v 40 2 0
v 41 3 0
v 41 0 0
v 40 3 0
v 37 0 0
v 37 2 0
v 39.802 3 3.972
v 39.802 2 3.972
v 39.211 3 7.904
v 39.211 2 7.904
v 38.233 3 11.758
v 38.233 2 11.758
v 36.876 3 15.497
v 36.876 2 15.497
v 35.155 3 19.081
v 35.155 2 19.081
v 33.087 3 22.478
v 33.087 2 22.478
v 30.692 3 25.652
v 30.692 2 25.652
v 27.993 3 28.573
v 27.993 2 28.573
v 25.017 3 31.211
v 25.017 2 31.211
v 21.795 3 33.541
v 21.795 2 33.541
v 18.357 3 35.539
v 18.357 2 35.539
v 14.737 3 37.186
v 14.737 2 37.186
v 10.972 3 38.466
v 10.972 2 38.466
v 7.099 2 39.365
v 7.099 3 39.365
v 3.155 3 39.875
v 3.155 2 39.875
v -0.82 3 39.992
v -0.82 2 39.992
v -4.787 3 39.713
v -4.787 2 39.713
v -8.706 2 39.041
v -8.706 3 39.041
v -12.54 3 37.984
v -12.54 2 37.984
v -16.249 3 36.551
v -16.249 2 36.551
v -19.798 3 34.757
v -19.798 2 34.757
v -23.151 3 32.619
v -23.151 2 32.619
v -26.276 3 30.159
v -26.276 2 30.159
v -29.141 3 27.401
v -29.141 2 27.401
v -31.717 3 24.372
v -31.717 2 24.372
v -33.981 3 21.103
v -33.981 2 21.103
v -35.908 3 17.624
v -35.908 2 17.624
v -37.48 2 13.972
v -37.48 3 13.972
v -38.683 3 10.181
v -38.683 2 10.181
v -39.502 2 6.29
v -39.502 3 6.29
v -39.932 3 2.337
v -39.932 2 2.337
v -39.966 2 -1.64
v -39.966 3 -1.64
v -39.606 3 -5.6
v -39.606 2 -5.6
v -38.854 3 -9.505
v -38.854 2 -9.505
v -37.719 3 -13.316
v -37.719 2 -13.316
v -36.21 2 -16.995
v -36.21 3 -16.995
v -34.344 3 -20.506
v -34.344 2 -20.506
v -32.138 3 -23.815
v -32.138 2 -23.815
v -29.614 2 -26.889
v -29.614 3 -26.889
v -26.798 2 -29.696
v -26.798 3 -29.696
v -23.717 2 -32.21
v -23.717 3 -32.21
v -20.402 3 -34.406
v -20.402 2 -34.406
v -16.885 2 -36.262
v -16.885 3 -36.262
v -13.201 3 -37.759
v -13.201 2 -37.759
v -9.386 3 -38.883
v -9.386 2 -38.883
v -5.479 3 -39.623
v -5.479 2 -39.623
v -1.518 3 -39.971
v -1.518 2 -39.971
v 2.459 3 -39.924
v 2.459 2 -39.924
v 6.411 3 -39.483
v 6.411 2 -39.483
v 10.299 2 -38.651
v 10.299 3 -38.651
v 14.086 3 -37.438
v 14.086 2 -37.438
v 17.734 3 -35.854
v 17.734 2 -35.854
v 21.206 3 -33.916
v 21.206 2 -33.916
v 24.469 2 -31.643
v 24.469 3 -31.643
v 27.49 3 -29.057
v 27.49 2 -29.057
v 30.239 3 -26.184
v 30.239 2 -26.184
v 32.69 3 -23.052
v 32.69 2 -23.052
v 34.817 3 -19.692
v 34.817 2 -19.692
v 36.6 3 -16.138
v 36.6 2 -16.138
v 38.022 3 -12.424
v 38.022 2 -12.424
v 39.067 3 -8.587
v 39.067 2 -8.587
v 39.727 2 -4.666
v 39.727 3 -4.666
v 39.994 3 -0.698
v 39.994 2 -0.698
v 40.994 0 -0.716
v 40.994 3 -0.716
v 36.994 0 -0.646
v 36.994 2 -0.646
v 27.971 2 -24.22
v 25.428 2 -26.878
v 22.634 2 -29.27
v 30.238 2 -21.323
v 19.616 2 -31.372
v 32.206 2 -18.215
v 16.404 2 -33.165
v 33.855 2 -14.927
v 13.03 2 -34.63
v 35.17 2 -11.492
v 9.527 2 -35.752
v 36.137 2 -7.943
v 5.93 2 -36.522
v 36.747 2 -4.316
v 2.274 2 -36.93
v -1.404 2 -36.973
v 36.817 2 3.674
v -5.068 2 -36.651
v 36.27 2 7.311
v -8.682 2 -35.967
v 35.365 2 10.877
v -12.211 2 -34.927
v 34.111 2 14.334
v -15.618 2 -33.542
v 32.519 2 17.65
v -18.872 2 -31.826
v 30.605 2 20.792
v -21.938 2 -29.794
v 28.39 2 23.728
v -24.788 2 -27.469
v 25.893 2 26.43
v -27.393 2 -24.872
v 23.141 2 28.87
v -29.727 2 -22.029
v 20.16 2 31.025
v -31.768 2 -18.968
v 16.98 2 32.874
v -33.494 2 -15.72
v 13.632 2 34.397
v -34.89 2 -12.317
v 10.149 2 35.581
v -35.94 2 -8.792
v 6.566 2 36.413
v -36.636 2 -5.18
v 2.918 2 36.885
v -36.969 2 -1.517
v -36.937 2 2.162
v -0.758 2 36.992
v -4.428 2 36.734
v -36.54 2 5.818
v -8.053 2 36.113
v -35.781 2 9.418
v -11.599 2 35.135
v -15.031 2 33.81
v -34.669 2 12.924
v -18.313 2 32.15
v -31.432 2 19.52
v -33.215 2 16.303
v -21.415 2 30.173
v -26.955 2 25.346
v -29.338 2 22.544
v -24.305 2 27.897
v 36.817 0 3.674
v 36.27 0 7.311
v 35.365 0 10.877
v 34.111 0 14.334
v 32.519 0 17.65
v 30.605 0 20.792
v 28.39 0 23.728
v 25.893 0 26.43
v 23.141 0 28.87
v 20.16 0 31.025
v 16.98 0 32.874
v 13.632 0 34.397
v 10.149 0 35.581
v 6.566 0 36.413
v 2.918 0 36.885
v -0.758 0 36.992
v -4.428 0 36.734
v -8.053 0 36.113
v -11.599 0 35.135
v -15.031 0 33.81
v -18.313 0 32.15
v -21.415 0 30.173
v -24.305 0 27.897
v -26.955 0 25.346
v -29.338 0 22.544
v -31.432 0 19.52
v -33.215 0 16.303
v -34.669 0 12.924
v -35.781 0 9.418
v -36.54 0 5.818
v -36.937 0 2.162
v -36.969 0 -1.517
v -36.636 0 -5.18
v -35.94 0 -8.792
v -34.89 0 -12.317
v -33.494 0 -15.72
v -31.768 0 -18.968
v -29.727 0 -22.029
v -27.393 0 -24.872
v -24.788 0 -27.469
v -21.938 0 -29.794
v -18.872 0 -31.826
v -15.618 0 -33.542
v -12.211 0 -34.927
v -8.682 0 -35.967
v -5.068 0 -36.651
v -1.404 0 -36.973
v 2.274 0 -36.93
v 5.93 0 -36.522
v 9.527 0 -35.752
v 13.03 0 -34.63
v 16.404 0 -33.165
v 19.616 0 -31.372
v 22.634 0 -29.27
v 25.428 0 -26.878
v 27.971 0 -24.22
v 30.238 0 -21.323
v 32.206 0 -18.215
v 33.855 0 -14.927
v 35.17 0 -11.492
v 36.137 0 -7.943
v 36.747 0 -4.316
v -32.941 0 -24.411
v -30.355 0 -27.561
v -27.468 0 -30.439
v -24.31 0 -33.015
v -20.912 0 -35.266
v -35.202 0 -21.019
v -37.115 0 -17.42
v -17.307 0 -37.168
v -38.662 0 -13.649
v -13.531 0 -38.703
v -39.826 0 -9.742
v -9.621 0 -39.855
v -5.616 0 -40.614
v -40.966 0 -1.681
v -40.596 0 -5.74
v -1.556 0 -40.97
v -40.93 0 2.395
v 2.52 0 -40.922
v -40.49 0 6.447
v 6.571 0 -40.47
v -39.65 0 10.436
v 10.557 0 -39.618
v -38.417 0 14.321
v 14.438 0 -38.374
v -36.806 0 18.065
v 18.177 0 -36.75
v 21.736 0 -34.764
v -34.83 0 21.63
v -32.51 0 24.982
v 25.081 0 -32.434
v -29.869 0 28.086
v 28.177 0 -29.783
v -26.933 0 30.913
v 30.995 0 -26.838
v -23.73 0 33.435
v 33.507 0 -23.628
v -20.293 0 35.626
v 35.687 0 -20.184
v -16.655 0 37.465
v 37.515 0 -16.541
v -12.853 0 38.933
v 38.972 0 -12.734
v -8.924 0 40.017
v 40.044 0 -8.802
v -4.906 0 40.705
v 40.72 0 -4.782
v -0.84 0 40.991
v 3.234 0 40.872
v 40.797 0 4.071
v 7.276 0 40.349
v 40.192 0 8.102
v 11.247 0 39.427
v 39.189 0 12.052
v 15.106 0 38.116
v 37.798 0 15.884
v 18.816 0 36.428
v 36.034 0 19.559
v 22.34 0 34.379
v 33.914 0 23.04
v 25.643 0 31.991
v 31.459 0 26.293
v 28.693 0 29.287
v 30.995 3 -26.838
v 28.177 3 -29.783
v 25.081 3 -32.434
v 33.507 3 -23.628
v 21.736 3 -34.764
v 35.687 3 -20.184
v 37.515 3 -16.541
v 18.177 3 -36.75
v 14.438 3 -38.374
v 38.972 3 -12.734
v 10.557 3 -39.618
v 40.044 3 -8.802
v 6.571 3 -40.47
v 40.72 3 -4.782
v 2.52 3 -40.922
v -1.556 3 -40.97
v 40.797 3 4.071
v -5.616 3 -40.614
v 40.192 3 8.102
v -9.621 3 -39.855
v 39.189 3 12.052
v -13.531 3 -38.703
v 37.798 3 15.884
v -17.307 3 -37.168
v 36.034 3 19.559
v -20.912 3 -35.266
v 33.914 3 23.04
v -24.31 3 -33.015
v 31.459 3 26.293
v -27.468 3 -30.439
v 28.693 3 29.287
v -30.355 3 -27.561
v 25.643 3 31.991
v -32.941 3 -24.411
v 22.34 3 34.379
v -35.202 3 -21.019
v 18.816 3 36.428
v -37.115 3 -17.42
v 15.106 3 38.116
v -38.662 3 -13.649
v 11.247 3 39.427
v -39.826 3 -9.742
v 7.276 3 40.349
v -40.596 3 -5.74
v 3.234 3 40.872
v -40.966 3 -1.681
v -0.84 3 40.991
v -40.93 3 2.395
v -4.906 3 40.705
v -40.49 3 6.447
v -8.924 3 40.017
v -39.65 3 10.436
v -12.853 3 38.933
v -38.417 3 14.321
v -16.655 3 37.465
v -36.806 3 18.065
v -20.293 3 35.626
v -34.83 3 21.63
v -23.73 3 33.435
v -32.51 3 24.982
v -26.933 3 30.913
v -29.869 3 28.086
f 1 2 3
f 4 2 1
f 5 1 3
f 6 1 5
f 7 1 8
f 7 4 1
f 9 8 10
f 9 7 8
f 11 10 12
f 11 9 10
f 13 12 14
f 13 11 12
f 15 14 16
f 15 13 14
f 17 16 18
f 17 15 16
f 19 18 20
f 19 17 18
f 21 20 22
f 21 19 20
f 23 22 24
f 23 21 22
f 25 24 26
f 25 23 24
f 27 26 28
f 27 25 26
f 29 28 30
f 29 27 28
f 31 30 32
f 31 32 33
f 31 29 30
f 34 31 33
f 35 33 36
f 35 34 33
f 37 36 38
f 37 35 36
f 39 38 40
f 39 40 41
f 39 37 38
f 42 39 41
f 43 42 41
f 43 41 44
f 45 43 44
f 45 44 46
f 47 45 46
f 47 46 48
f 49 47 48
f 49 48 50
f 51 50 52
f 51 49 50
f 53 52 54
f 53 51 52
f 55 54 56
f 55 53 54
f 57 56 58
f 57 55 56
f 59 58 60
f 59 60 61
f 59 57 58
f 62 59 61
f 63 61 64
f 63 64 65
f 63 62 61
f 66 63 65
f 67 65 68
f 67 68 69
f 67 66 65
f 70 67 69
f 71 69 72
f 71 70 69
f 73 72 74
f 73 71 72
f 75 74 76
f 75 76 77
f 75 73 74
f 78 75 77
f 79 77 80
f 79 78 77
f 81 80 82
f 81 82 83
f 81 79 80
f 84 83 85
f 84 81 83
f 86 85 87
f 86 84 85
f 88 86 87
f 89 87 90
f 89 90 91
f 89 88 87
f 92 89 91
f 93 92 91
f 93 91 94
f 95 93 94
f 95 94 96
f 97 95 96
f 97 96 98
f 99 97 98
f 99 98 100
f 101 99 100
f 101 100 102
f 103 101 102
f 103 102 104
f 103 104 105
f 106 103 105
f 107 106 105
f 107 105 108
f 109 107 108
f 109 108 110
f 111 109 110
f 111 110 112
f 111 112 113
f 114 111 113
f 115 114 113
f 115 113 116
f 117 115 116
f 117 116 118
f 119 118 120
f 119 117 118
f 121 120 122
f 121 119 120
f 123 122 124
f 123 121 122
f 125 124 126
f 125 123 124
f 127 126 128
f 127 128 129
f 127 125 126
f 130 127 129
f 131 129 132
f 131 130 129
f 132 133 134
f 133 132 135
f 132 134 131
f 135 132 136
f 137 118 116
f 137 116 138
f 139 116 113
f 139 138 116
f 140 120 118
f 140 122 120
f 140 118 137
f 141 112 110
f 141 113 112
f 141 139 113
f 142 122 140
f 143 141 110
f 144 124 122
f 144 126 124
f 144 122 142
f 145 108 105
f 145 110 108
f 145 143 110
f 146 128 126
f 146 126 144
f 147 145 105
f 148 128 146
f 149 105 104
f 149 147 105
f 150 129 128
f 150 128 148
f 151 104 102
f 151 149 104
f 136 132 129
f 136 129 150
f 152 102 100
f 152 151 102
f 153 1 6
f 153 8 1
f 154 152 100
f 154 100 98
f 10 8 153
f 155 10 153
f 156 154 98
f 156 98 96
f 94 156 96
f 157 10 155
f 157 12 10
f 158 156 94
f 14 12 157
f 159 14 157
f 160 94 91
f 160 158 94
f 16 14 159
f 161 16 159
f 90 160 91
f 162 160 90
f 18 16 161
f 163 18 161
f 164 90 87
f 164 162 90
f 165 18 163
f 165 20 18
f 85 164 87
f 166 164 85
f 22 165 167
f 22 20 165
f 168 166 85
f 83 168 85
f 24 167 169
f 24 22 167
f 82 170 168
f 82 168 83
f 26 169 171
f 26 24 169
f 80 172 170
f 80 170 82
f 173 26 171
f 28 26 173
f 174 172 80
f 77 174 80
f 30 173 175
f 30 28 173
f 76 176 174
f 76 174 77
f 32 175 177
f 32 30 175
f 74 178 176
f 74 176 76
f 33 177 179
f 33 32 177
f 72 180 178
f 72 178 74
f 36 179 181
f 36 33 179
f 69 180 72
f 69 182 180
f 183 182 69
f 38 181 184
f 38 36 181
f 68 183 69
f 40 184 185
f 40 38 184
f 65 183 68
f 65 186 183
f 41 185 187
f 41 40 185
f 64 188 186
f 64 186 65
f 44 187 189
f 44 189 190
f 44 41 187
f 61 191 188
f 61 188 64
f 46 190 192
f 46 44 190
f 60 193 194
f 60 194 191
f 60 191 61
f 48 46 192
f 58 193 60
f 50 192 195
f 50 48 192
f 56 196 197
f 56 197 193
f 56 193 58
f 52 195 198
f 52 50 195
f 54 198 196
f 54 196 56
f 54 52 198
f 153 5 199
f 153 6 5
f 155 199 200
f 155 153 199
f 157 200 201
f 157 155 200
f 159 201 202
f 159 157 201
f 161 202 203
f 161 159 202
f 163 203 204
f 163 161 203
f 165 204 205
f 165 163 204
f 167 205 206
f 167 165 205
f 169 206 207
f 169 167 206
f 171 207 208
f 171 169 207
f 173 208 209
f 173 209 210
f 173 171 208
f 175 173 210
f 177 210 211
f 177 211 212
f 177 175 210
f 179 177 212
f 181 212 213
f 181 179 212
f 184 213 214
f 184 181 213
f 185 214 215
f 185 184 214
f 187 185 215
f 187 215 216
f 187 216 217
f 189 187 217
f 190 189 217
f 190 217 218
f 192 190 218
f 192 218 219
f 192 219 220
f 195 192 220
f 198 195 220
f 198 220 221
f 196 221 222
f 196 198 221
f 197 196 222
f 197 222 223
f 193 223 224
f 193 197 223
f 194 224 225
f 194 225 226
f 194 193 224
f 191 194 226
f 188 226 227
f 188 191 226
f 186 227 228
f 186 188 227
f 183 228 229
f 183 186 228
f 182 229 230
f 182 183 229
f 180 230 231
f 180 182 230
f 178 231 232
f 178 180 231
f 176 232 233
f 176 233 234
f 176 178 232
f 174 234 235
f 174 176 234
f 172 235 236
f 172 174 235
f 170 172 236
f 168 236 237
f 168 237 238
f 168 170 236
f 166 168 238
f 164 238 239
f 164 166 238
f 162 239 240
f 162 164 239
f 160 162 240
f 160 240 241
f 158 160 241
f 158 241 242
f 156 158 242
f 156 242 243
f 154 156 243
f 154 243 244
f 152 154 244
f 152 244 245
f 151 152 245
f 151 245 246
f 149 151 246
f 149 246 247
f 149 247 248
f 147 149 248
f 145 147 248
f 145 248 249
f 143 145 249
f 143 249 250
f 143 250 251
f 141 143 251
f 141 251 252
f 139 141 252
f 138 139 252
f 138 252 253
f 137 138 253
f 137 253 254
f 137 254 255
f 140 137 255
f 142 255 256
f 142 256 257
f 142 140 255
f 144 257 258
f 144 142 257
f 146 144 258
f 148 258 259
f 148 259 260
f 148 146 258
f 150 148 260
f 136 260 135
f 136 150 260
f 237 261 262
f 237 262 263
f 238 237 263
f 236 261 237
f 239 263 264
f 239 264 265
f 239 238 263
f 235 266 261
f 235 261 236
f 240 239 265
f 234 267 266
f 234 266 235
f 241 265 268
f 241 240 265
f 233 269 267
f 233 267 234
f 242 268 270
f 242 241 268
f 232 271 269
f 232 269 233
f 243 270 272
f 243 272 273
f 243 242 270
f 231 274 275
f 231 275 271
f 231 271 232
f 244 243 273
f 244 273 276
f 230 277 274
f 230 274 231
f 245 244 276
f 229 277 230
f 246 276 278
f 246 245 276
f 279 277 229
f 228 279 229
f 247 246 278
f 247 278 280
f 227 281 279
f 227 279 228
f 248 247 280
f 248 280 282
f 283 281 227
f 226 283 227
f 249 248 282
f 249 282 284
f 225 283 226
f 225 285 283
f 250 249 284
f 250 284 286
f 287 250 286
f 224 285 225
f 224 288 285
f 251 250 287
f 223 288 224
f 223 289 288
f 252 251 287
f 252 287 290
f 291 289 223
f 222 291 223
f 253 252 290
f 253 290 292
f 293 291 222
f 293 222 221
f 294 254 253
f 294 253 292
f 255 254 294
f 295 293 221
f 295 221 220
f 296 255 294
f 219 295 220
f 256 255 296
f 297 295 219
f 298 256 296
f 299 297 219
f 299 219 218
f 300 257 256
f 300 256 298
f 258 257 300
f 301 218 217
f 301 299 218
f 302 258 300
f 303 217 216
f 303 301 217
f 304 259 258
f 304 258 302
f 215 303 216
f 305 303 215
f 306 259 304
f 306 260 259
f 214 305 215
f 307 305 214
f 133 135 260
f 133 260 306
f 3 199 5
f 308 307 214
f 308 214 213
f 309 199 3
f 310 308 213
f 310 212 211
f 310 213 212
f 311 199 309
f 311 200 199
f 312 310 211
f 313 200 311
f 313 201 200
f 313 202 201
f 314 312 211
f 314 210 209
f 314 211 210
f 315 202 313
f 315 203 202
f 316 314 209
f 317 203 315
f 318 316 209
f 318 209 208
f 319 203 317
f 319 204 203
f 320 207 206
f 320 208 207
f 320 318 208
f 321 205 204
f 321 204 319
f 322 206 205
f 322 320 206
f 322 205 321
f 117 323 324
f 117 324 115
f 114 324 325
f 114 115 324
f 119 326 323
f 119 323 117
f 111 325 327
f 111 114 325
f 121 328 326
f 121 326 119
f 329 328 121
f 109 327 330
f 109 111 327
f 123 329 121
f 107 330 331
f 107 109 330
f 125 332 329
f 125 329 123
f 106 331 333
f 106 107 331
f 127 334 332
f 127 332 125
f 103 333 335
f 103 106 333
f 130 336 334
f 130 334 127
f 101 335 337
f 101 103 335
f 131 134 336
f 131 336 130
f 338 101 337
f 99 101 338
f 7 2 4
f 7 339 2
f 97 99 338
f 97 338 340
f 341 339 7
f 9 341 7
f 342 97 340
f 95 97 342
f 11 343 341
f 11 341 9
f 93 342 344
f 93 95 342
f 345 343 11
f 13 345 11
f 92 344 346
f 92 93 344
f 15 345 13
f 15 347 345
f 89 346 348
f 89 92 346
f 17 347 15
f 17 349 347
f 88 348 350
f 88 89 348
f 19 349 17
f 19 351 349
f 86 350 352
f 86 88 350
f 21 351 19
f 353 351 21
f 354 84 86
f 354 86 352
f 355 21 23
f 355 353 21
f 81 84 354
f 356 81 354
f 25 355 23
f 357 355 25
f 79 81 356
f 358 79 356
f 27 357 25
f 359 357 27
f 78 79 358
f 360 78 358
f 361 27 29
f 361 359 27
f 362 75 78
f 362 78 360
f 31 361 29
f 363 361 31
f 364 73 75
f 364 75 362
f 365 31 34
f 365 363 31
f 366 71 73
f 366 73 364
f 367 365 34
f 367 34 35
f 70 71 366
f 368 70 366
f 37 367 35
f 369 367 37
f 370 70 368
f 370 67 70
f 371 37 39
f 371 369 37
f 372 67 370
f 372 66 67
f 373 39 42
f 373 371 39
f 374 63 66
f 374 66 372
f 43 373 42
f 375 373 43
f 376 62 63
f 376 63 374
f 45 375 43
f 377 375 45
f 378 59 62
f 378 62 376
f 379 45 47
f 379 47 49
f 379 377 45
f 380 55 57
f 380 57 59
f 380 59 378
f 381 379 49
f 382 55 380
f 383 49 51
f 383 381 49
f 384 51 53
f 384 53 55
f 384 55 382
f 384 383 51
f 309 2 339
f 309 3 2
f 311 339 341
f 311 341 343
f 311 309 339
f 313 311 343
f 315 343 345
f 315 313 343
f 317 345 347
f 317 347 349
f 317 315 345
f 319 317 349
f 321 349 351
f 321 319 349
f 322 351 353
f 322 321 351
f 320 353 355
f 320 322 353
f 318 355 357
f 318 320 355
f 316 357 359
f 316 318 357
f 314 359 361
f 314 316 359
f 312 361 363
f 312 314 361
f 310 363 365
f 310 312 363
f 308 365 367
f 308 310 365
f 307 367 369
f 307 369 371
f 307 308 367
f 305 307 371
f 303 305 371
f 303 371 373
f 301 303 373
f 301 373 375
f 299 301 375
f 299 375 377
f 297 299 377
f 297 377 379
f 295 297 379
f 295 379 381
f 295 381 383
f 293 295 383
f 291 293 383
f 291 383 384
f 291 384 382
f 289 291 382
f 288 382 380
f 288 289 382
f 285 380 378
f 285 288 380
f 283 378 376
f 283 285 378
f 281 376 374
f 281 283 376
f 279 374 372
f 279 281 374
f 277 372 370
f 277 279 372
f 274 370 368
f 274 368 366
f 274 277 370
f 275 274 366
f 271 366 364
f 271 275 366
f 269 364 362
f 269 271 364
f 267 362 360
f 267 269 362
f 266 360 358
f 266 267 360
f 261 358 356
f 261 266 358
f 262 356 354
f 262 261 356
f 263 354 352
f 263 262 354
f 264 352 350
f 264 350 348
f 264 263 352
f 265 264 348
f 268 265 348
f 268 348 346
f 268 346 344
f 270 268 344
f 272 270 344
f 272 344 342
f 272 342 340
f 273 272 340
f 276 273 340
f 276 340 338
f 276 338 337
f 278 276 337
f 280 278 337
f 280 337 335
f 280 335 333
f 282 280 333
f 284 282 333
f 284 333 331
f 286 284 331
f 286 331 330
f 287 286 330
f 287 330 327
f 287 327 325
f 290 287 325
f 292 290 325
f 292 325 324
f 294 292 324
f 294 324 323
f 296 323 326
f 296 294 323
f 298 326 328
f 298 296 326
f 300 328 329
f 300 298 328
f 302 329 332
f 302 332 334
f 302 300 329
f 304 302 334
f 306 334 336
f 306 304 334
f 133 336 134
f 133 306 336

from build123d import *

# Parameters (mm, degrees)
REVOLVE_1_ANGLE = 359


with BuildPart() as part:
    # 草图1 → 旋转1 (revolve)
    with BuildSketch(Plane.XY):
        Polygon((40, 3), (41, 3), (41, 0), (37, 0), (37, 2), (40, 2), align=None)
    revolve(axis=Axis((0, 10, 0), (0, -1, 0)), revolution_arc=REVOLVE_1_ANGLE)


solid = part.part
